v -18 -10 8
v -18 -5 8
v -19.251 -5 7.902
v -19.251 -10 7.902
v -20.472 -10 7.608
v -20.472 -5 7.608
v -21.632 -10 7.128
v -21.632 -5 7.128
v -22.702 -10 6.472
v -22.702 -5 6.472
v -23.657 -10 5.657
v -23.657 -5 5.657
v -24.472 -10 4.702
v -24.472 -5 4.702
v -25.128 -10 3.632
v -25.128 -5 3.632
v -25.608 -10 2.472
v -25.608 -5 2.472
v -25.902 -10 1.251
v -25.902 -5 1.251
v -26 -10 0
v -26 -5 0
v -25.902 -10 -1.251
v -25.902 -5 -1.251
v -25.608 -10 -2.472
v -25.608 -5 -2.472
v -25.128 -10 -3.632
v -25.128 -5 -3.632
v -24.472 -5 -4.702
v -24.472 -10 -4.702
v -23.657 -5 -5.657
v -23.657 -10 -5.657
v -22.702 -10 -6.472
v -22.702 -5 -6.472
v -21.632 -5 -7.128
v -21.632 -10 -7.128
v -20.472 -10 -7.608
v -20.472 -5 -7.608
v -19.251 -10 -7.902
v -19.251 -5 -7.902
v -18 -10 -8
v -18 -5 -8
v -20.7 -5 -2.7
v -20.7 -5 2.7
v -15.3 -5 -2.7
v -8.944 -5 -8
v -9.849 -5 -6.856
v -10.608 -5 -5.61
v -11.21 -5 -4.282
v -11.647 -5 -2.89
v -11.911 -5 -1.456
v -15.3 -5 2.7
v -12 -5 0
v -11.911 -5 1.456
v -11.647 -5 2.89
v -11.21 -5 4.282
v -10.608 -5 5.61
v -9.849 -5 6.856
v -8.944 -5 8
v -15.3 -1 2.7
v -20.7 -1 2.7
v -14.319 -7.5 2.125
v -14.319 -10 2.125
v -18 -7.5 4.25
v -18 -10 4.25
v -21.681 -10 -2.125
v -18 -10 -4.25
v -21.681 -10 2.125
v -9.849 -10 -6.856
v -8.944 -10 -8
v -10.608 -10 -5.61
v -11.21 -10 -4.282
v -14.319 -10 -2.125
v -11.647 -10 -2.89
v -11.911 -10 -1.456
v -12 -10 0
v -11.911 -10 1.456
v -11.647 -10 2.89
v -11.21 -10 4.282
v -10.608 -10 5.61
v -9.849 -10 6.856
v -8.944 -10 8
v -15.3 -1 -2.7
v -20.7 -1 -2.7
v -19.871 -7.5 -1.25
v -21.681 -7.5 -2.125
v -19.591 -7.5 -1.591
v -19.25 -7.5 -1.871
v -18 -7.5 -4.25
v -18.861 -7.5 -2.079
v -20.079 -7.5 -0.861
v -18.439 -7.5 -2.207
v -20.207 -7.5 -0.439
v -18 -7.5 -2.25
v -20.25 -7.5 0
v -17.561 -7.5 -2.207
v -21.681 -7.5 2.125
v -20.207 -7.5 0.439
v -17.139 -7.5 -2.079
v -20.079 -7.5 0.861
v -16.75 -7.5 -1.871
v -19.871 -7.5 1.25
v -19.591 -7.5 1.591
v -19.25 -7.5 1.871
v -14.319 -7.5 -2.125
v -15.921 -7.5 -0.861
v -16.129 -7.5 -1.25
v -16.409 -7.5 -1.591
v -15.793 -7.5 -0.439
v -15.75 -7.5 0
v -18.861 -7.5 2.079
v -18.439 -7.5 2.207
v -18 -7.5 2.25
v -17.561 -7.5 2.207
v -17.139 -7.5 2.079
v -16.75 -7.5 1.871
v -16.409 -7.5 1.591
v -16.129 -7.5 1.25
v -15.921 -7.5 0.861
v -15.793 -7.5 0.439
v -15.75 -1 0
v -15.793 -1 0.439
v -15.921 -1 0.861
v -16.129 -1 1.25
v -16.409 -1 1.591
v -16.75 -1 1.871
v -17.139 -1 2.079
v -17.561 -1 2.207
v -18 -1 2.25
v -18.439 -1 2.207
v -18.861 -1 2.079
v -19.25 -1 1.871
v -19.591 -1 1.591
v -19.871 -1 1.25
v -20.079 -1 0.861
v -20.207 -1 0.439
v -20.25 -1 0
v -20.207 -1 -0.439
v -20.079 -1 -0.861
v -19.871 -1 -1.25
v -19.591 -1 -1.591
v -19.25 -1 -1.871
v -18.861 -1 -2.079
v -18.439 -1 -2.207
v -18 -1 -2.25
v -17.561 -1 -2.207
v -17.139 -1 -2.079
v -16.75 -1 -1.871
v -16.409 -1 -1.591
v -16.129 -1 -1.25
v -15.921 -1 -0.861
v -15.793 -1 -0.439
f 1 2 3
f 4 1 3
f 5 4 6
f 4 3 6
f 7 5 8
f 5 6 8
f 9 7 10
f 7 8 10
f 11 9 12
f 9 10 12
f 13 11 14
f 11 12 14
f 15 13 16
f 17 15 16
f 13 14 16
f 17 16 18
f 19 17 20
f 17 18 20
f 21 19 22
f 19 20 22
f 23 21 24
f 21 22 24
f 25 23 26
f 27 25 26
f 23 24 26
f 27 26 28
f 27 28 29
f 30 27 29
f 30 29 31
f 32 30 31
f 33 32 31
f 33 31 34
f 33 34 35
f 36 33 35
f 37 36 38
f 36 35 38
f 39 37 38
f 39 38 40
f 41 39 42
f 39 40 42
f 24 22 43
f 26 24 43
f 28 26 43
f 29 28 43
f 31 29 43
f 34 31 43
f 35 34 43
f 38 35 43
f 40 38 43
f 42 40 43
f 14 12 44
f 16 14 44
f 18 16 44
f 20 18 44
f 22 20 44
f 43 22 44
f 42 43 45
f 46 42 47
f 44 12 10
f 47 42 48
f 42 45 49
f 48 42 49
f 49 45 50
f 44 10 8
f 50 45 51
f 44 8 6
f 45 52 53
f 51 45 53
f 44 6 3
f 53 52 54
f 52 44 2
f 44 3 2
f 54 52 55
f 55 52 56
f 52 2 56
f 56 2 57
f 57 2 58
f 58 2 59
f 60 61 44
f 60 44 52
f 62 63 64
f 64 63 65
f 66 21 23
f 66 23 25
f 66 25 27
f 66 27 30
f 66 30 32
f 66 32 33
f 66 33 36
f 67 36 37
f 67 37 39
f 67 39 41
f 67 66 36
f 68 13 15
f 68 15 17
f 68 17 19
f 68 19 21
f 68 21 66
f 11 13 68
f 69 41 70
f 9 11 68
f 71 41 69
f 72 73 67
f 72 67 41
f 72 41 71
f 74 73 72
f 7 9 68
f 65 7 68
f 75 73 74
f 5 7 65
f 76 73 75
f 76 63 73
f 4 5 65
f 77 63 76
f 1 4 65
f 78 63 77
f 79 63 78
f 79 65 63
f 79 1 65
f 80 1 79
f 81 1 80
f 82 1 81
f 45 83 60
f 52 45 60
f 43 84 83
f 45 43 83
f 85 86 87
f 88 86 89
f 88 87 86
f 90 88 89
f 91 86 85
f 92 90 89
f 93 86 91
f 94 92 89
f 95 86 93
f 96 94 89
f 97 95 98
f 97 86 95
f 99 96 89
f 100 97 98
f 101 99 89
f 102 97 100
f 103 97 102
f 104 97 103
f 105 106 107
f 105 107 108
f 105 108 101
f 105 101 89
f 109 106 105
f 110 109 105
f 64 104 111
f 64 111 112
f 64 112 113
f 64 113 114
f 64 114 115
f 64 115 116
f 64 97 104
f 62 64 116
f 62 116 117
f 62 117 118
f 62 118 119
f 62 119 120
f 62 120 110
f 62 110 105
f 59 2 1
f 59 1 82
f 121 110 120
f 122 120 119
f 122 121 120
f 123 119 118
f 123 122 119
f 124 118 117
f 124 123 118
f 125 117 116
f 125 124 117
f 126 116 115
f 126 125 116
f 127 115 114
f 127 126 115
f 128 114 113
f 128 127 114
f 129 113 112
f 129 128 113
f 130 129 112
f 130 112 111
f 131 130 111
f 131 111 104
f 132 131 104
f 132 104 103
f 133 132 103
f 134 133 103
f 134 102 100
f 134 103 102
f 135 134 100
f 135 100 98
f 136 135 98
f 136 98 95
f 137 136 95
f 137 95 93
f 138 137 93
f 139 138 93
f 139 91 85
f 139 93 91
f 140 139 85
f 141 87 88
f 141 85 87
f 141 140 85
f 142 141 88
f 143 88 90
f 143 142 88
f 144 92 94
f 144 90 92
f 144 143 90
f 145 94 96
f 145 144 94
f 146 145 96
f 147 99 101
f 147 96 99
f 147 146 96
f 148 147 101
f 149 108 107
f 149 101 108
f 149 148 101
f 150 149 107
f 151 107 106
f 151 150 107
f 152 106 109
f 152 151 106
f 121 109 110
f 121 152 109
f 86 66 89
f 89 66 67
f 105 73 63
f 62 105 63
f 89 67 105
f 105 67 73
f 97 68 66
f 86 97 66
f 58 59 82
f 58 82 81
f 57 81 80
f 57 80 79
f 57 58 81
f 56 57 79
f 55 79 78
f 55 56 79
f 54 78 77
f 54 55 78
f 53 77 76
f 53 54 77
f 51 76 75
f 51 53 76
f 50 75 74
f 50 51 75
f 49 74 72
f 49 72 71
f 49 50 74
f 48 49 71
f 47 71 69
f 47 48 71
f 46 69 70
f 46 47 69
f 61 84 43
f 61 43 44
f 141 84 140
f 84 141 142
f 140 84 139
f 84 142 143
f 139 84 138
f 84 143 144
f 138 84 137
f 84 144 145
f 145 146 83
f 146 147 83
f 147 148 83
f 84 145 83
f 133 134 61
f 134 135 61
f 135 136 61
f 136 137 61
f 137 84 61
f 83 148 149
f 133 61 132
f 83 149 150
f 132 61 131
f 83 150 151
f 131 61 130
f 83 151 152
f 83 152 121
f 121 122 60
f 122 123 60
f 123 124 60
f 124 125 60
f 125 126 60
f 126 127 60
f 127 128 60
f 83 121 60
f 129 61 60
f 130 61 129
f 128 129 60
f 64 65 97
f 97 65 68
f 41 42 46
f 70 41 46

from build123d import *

# Parameters (mm, degrees)
PAD023_DEPTH      = 5
BOX003_W          = 5.4
BOX003_H          = 5.4
BOX003_DEPTH      = 4
CYLINDER064_R     = 2.25
CYLINDER064_DEPTH = 9
POCKET005_DEPTH   = 2.5


with BuildPart() as part:
    # Sketch033 → Pad023 (new body)
    with BuildSketch(Plane.XZ):
        with BuildLine():
            ThreePointArc((-18, 8), (-26, 0), (-18, -8))
            Line((-18, -8), (-8.944272, -8))
            ThreePointArc((-8.944272, 8), (-12, 0), (-8.944272, -8))
            Line((-18, 8), (-8.944272, 8))
        make_face()
    extrude(amount=PAD023_DEPTH)

    # Box003 → Box003 (join)
    with BuildSketch(Plane(origin=(-20.7, 4, -2.7), x_dir=(1, 0, 0), z_dir=(0, -1, 0))):
        with Locations((2.7, 2.7)):
            Rectangle(BOX003_W, BOX003_H)
    extrude(amount=BOX003_DEPTH)

    # Cylinder064 → Cylinder064 (cut)
    with BuildSketch(Plane(origin=(-18, 4, 0), x_dir=(1, 0, 0), z_dir=(0, -1, 0))):
        Circle(CYLINDER064_R)
    extrude(amount=CYLINDER064_DEPTH, mode=Mode.SUBTRACT)

    # Sketch035 (on Face5 of Cylinder064) → Pocket005 (cut)
    with BuildSketch(Plane(origin=(-18, -5, 0), x_dir=(1, 0, 0), z_dir=(0, -1, 0))):
        Polygon((3.680608, 2.125), (0, 4.25), (-3.680608, 2.125), (-3.680608, -2.125), (0, -4.25), (3.680608, -2.125), align=None)
    extrude(amount=-POCKET005_DEPTH, mode=Mode.SUBTRACT)


with BuildPart() as part_1:
    # Body035 placement: moved
    add(part.part.moved(Location((0, -5, 0))))


solid = part_1.part
